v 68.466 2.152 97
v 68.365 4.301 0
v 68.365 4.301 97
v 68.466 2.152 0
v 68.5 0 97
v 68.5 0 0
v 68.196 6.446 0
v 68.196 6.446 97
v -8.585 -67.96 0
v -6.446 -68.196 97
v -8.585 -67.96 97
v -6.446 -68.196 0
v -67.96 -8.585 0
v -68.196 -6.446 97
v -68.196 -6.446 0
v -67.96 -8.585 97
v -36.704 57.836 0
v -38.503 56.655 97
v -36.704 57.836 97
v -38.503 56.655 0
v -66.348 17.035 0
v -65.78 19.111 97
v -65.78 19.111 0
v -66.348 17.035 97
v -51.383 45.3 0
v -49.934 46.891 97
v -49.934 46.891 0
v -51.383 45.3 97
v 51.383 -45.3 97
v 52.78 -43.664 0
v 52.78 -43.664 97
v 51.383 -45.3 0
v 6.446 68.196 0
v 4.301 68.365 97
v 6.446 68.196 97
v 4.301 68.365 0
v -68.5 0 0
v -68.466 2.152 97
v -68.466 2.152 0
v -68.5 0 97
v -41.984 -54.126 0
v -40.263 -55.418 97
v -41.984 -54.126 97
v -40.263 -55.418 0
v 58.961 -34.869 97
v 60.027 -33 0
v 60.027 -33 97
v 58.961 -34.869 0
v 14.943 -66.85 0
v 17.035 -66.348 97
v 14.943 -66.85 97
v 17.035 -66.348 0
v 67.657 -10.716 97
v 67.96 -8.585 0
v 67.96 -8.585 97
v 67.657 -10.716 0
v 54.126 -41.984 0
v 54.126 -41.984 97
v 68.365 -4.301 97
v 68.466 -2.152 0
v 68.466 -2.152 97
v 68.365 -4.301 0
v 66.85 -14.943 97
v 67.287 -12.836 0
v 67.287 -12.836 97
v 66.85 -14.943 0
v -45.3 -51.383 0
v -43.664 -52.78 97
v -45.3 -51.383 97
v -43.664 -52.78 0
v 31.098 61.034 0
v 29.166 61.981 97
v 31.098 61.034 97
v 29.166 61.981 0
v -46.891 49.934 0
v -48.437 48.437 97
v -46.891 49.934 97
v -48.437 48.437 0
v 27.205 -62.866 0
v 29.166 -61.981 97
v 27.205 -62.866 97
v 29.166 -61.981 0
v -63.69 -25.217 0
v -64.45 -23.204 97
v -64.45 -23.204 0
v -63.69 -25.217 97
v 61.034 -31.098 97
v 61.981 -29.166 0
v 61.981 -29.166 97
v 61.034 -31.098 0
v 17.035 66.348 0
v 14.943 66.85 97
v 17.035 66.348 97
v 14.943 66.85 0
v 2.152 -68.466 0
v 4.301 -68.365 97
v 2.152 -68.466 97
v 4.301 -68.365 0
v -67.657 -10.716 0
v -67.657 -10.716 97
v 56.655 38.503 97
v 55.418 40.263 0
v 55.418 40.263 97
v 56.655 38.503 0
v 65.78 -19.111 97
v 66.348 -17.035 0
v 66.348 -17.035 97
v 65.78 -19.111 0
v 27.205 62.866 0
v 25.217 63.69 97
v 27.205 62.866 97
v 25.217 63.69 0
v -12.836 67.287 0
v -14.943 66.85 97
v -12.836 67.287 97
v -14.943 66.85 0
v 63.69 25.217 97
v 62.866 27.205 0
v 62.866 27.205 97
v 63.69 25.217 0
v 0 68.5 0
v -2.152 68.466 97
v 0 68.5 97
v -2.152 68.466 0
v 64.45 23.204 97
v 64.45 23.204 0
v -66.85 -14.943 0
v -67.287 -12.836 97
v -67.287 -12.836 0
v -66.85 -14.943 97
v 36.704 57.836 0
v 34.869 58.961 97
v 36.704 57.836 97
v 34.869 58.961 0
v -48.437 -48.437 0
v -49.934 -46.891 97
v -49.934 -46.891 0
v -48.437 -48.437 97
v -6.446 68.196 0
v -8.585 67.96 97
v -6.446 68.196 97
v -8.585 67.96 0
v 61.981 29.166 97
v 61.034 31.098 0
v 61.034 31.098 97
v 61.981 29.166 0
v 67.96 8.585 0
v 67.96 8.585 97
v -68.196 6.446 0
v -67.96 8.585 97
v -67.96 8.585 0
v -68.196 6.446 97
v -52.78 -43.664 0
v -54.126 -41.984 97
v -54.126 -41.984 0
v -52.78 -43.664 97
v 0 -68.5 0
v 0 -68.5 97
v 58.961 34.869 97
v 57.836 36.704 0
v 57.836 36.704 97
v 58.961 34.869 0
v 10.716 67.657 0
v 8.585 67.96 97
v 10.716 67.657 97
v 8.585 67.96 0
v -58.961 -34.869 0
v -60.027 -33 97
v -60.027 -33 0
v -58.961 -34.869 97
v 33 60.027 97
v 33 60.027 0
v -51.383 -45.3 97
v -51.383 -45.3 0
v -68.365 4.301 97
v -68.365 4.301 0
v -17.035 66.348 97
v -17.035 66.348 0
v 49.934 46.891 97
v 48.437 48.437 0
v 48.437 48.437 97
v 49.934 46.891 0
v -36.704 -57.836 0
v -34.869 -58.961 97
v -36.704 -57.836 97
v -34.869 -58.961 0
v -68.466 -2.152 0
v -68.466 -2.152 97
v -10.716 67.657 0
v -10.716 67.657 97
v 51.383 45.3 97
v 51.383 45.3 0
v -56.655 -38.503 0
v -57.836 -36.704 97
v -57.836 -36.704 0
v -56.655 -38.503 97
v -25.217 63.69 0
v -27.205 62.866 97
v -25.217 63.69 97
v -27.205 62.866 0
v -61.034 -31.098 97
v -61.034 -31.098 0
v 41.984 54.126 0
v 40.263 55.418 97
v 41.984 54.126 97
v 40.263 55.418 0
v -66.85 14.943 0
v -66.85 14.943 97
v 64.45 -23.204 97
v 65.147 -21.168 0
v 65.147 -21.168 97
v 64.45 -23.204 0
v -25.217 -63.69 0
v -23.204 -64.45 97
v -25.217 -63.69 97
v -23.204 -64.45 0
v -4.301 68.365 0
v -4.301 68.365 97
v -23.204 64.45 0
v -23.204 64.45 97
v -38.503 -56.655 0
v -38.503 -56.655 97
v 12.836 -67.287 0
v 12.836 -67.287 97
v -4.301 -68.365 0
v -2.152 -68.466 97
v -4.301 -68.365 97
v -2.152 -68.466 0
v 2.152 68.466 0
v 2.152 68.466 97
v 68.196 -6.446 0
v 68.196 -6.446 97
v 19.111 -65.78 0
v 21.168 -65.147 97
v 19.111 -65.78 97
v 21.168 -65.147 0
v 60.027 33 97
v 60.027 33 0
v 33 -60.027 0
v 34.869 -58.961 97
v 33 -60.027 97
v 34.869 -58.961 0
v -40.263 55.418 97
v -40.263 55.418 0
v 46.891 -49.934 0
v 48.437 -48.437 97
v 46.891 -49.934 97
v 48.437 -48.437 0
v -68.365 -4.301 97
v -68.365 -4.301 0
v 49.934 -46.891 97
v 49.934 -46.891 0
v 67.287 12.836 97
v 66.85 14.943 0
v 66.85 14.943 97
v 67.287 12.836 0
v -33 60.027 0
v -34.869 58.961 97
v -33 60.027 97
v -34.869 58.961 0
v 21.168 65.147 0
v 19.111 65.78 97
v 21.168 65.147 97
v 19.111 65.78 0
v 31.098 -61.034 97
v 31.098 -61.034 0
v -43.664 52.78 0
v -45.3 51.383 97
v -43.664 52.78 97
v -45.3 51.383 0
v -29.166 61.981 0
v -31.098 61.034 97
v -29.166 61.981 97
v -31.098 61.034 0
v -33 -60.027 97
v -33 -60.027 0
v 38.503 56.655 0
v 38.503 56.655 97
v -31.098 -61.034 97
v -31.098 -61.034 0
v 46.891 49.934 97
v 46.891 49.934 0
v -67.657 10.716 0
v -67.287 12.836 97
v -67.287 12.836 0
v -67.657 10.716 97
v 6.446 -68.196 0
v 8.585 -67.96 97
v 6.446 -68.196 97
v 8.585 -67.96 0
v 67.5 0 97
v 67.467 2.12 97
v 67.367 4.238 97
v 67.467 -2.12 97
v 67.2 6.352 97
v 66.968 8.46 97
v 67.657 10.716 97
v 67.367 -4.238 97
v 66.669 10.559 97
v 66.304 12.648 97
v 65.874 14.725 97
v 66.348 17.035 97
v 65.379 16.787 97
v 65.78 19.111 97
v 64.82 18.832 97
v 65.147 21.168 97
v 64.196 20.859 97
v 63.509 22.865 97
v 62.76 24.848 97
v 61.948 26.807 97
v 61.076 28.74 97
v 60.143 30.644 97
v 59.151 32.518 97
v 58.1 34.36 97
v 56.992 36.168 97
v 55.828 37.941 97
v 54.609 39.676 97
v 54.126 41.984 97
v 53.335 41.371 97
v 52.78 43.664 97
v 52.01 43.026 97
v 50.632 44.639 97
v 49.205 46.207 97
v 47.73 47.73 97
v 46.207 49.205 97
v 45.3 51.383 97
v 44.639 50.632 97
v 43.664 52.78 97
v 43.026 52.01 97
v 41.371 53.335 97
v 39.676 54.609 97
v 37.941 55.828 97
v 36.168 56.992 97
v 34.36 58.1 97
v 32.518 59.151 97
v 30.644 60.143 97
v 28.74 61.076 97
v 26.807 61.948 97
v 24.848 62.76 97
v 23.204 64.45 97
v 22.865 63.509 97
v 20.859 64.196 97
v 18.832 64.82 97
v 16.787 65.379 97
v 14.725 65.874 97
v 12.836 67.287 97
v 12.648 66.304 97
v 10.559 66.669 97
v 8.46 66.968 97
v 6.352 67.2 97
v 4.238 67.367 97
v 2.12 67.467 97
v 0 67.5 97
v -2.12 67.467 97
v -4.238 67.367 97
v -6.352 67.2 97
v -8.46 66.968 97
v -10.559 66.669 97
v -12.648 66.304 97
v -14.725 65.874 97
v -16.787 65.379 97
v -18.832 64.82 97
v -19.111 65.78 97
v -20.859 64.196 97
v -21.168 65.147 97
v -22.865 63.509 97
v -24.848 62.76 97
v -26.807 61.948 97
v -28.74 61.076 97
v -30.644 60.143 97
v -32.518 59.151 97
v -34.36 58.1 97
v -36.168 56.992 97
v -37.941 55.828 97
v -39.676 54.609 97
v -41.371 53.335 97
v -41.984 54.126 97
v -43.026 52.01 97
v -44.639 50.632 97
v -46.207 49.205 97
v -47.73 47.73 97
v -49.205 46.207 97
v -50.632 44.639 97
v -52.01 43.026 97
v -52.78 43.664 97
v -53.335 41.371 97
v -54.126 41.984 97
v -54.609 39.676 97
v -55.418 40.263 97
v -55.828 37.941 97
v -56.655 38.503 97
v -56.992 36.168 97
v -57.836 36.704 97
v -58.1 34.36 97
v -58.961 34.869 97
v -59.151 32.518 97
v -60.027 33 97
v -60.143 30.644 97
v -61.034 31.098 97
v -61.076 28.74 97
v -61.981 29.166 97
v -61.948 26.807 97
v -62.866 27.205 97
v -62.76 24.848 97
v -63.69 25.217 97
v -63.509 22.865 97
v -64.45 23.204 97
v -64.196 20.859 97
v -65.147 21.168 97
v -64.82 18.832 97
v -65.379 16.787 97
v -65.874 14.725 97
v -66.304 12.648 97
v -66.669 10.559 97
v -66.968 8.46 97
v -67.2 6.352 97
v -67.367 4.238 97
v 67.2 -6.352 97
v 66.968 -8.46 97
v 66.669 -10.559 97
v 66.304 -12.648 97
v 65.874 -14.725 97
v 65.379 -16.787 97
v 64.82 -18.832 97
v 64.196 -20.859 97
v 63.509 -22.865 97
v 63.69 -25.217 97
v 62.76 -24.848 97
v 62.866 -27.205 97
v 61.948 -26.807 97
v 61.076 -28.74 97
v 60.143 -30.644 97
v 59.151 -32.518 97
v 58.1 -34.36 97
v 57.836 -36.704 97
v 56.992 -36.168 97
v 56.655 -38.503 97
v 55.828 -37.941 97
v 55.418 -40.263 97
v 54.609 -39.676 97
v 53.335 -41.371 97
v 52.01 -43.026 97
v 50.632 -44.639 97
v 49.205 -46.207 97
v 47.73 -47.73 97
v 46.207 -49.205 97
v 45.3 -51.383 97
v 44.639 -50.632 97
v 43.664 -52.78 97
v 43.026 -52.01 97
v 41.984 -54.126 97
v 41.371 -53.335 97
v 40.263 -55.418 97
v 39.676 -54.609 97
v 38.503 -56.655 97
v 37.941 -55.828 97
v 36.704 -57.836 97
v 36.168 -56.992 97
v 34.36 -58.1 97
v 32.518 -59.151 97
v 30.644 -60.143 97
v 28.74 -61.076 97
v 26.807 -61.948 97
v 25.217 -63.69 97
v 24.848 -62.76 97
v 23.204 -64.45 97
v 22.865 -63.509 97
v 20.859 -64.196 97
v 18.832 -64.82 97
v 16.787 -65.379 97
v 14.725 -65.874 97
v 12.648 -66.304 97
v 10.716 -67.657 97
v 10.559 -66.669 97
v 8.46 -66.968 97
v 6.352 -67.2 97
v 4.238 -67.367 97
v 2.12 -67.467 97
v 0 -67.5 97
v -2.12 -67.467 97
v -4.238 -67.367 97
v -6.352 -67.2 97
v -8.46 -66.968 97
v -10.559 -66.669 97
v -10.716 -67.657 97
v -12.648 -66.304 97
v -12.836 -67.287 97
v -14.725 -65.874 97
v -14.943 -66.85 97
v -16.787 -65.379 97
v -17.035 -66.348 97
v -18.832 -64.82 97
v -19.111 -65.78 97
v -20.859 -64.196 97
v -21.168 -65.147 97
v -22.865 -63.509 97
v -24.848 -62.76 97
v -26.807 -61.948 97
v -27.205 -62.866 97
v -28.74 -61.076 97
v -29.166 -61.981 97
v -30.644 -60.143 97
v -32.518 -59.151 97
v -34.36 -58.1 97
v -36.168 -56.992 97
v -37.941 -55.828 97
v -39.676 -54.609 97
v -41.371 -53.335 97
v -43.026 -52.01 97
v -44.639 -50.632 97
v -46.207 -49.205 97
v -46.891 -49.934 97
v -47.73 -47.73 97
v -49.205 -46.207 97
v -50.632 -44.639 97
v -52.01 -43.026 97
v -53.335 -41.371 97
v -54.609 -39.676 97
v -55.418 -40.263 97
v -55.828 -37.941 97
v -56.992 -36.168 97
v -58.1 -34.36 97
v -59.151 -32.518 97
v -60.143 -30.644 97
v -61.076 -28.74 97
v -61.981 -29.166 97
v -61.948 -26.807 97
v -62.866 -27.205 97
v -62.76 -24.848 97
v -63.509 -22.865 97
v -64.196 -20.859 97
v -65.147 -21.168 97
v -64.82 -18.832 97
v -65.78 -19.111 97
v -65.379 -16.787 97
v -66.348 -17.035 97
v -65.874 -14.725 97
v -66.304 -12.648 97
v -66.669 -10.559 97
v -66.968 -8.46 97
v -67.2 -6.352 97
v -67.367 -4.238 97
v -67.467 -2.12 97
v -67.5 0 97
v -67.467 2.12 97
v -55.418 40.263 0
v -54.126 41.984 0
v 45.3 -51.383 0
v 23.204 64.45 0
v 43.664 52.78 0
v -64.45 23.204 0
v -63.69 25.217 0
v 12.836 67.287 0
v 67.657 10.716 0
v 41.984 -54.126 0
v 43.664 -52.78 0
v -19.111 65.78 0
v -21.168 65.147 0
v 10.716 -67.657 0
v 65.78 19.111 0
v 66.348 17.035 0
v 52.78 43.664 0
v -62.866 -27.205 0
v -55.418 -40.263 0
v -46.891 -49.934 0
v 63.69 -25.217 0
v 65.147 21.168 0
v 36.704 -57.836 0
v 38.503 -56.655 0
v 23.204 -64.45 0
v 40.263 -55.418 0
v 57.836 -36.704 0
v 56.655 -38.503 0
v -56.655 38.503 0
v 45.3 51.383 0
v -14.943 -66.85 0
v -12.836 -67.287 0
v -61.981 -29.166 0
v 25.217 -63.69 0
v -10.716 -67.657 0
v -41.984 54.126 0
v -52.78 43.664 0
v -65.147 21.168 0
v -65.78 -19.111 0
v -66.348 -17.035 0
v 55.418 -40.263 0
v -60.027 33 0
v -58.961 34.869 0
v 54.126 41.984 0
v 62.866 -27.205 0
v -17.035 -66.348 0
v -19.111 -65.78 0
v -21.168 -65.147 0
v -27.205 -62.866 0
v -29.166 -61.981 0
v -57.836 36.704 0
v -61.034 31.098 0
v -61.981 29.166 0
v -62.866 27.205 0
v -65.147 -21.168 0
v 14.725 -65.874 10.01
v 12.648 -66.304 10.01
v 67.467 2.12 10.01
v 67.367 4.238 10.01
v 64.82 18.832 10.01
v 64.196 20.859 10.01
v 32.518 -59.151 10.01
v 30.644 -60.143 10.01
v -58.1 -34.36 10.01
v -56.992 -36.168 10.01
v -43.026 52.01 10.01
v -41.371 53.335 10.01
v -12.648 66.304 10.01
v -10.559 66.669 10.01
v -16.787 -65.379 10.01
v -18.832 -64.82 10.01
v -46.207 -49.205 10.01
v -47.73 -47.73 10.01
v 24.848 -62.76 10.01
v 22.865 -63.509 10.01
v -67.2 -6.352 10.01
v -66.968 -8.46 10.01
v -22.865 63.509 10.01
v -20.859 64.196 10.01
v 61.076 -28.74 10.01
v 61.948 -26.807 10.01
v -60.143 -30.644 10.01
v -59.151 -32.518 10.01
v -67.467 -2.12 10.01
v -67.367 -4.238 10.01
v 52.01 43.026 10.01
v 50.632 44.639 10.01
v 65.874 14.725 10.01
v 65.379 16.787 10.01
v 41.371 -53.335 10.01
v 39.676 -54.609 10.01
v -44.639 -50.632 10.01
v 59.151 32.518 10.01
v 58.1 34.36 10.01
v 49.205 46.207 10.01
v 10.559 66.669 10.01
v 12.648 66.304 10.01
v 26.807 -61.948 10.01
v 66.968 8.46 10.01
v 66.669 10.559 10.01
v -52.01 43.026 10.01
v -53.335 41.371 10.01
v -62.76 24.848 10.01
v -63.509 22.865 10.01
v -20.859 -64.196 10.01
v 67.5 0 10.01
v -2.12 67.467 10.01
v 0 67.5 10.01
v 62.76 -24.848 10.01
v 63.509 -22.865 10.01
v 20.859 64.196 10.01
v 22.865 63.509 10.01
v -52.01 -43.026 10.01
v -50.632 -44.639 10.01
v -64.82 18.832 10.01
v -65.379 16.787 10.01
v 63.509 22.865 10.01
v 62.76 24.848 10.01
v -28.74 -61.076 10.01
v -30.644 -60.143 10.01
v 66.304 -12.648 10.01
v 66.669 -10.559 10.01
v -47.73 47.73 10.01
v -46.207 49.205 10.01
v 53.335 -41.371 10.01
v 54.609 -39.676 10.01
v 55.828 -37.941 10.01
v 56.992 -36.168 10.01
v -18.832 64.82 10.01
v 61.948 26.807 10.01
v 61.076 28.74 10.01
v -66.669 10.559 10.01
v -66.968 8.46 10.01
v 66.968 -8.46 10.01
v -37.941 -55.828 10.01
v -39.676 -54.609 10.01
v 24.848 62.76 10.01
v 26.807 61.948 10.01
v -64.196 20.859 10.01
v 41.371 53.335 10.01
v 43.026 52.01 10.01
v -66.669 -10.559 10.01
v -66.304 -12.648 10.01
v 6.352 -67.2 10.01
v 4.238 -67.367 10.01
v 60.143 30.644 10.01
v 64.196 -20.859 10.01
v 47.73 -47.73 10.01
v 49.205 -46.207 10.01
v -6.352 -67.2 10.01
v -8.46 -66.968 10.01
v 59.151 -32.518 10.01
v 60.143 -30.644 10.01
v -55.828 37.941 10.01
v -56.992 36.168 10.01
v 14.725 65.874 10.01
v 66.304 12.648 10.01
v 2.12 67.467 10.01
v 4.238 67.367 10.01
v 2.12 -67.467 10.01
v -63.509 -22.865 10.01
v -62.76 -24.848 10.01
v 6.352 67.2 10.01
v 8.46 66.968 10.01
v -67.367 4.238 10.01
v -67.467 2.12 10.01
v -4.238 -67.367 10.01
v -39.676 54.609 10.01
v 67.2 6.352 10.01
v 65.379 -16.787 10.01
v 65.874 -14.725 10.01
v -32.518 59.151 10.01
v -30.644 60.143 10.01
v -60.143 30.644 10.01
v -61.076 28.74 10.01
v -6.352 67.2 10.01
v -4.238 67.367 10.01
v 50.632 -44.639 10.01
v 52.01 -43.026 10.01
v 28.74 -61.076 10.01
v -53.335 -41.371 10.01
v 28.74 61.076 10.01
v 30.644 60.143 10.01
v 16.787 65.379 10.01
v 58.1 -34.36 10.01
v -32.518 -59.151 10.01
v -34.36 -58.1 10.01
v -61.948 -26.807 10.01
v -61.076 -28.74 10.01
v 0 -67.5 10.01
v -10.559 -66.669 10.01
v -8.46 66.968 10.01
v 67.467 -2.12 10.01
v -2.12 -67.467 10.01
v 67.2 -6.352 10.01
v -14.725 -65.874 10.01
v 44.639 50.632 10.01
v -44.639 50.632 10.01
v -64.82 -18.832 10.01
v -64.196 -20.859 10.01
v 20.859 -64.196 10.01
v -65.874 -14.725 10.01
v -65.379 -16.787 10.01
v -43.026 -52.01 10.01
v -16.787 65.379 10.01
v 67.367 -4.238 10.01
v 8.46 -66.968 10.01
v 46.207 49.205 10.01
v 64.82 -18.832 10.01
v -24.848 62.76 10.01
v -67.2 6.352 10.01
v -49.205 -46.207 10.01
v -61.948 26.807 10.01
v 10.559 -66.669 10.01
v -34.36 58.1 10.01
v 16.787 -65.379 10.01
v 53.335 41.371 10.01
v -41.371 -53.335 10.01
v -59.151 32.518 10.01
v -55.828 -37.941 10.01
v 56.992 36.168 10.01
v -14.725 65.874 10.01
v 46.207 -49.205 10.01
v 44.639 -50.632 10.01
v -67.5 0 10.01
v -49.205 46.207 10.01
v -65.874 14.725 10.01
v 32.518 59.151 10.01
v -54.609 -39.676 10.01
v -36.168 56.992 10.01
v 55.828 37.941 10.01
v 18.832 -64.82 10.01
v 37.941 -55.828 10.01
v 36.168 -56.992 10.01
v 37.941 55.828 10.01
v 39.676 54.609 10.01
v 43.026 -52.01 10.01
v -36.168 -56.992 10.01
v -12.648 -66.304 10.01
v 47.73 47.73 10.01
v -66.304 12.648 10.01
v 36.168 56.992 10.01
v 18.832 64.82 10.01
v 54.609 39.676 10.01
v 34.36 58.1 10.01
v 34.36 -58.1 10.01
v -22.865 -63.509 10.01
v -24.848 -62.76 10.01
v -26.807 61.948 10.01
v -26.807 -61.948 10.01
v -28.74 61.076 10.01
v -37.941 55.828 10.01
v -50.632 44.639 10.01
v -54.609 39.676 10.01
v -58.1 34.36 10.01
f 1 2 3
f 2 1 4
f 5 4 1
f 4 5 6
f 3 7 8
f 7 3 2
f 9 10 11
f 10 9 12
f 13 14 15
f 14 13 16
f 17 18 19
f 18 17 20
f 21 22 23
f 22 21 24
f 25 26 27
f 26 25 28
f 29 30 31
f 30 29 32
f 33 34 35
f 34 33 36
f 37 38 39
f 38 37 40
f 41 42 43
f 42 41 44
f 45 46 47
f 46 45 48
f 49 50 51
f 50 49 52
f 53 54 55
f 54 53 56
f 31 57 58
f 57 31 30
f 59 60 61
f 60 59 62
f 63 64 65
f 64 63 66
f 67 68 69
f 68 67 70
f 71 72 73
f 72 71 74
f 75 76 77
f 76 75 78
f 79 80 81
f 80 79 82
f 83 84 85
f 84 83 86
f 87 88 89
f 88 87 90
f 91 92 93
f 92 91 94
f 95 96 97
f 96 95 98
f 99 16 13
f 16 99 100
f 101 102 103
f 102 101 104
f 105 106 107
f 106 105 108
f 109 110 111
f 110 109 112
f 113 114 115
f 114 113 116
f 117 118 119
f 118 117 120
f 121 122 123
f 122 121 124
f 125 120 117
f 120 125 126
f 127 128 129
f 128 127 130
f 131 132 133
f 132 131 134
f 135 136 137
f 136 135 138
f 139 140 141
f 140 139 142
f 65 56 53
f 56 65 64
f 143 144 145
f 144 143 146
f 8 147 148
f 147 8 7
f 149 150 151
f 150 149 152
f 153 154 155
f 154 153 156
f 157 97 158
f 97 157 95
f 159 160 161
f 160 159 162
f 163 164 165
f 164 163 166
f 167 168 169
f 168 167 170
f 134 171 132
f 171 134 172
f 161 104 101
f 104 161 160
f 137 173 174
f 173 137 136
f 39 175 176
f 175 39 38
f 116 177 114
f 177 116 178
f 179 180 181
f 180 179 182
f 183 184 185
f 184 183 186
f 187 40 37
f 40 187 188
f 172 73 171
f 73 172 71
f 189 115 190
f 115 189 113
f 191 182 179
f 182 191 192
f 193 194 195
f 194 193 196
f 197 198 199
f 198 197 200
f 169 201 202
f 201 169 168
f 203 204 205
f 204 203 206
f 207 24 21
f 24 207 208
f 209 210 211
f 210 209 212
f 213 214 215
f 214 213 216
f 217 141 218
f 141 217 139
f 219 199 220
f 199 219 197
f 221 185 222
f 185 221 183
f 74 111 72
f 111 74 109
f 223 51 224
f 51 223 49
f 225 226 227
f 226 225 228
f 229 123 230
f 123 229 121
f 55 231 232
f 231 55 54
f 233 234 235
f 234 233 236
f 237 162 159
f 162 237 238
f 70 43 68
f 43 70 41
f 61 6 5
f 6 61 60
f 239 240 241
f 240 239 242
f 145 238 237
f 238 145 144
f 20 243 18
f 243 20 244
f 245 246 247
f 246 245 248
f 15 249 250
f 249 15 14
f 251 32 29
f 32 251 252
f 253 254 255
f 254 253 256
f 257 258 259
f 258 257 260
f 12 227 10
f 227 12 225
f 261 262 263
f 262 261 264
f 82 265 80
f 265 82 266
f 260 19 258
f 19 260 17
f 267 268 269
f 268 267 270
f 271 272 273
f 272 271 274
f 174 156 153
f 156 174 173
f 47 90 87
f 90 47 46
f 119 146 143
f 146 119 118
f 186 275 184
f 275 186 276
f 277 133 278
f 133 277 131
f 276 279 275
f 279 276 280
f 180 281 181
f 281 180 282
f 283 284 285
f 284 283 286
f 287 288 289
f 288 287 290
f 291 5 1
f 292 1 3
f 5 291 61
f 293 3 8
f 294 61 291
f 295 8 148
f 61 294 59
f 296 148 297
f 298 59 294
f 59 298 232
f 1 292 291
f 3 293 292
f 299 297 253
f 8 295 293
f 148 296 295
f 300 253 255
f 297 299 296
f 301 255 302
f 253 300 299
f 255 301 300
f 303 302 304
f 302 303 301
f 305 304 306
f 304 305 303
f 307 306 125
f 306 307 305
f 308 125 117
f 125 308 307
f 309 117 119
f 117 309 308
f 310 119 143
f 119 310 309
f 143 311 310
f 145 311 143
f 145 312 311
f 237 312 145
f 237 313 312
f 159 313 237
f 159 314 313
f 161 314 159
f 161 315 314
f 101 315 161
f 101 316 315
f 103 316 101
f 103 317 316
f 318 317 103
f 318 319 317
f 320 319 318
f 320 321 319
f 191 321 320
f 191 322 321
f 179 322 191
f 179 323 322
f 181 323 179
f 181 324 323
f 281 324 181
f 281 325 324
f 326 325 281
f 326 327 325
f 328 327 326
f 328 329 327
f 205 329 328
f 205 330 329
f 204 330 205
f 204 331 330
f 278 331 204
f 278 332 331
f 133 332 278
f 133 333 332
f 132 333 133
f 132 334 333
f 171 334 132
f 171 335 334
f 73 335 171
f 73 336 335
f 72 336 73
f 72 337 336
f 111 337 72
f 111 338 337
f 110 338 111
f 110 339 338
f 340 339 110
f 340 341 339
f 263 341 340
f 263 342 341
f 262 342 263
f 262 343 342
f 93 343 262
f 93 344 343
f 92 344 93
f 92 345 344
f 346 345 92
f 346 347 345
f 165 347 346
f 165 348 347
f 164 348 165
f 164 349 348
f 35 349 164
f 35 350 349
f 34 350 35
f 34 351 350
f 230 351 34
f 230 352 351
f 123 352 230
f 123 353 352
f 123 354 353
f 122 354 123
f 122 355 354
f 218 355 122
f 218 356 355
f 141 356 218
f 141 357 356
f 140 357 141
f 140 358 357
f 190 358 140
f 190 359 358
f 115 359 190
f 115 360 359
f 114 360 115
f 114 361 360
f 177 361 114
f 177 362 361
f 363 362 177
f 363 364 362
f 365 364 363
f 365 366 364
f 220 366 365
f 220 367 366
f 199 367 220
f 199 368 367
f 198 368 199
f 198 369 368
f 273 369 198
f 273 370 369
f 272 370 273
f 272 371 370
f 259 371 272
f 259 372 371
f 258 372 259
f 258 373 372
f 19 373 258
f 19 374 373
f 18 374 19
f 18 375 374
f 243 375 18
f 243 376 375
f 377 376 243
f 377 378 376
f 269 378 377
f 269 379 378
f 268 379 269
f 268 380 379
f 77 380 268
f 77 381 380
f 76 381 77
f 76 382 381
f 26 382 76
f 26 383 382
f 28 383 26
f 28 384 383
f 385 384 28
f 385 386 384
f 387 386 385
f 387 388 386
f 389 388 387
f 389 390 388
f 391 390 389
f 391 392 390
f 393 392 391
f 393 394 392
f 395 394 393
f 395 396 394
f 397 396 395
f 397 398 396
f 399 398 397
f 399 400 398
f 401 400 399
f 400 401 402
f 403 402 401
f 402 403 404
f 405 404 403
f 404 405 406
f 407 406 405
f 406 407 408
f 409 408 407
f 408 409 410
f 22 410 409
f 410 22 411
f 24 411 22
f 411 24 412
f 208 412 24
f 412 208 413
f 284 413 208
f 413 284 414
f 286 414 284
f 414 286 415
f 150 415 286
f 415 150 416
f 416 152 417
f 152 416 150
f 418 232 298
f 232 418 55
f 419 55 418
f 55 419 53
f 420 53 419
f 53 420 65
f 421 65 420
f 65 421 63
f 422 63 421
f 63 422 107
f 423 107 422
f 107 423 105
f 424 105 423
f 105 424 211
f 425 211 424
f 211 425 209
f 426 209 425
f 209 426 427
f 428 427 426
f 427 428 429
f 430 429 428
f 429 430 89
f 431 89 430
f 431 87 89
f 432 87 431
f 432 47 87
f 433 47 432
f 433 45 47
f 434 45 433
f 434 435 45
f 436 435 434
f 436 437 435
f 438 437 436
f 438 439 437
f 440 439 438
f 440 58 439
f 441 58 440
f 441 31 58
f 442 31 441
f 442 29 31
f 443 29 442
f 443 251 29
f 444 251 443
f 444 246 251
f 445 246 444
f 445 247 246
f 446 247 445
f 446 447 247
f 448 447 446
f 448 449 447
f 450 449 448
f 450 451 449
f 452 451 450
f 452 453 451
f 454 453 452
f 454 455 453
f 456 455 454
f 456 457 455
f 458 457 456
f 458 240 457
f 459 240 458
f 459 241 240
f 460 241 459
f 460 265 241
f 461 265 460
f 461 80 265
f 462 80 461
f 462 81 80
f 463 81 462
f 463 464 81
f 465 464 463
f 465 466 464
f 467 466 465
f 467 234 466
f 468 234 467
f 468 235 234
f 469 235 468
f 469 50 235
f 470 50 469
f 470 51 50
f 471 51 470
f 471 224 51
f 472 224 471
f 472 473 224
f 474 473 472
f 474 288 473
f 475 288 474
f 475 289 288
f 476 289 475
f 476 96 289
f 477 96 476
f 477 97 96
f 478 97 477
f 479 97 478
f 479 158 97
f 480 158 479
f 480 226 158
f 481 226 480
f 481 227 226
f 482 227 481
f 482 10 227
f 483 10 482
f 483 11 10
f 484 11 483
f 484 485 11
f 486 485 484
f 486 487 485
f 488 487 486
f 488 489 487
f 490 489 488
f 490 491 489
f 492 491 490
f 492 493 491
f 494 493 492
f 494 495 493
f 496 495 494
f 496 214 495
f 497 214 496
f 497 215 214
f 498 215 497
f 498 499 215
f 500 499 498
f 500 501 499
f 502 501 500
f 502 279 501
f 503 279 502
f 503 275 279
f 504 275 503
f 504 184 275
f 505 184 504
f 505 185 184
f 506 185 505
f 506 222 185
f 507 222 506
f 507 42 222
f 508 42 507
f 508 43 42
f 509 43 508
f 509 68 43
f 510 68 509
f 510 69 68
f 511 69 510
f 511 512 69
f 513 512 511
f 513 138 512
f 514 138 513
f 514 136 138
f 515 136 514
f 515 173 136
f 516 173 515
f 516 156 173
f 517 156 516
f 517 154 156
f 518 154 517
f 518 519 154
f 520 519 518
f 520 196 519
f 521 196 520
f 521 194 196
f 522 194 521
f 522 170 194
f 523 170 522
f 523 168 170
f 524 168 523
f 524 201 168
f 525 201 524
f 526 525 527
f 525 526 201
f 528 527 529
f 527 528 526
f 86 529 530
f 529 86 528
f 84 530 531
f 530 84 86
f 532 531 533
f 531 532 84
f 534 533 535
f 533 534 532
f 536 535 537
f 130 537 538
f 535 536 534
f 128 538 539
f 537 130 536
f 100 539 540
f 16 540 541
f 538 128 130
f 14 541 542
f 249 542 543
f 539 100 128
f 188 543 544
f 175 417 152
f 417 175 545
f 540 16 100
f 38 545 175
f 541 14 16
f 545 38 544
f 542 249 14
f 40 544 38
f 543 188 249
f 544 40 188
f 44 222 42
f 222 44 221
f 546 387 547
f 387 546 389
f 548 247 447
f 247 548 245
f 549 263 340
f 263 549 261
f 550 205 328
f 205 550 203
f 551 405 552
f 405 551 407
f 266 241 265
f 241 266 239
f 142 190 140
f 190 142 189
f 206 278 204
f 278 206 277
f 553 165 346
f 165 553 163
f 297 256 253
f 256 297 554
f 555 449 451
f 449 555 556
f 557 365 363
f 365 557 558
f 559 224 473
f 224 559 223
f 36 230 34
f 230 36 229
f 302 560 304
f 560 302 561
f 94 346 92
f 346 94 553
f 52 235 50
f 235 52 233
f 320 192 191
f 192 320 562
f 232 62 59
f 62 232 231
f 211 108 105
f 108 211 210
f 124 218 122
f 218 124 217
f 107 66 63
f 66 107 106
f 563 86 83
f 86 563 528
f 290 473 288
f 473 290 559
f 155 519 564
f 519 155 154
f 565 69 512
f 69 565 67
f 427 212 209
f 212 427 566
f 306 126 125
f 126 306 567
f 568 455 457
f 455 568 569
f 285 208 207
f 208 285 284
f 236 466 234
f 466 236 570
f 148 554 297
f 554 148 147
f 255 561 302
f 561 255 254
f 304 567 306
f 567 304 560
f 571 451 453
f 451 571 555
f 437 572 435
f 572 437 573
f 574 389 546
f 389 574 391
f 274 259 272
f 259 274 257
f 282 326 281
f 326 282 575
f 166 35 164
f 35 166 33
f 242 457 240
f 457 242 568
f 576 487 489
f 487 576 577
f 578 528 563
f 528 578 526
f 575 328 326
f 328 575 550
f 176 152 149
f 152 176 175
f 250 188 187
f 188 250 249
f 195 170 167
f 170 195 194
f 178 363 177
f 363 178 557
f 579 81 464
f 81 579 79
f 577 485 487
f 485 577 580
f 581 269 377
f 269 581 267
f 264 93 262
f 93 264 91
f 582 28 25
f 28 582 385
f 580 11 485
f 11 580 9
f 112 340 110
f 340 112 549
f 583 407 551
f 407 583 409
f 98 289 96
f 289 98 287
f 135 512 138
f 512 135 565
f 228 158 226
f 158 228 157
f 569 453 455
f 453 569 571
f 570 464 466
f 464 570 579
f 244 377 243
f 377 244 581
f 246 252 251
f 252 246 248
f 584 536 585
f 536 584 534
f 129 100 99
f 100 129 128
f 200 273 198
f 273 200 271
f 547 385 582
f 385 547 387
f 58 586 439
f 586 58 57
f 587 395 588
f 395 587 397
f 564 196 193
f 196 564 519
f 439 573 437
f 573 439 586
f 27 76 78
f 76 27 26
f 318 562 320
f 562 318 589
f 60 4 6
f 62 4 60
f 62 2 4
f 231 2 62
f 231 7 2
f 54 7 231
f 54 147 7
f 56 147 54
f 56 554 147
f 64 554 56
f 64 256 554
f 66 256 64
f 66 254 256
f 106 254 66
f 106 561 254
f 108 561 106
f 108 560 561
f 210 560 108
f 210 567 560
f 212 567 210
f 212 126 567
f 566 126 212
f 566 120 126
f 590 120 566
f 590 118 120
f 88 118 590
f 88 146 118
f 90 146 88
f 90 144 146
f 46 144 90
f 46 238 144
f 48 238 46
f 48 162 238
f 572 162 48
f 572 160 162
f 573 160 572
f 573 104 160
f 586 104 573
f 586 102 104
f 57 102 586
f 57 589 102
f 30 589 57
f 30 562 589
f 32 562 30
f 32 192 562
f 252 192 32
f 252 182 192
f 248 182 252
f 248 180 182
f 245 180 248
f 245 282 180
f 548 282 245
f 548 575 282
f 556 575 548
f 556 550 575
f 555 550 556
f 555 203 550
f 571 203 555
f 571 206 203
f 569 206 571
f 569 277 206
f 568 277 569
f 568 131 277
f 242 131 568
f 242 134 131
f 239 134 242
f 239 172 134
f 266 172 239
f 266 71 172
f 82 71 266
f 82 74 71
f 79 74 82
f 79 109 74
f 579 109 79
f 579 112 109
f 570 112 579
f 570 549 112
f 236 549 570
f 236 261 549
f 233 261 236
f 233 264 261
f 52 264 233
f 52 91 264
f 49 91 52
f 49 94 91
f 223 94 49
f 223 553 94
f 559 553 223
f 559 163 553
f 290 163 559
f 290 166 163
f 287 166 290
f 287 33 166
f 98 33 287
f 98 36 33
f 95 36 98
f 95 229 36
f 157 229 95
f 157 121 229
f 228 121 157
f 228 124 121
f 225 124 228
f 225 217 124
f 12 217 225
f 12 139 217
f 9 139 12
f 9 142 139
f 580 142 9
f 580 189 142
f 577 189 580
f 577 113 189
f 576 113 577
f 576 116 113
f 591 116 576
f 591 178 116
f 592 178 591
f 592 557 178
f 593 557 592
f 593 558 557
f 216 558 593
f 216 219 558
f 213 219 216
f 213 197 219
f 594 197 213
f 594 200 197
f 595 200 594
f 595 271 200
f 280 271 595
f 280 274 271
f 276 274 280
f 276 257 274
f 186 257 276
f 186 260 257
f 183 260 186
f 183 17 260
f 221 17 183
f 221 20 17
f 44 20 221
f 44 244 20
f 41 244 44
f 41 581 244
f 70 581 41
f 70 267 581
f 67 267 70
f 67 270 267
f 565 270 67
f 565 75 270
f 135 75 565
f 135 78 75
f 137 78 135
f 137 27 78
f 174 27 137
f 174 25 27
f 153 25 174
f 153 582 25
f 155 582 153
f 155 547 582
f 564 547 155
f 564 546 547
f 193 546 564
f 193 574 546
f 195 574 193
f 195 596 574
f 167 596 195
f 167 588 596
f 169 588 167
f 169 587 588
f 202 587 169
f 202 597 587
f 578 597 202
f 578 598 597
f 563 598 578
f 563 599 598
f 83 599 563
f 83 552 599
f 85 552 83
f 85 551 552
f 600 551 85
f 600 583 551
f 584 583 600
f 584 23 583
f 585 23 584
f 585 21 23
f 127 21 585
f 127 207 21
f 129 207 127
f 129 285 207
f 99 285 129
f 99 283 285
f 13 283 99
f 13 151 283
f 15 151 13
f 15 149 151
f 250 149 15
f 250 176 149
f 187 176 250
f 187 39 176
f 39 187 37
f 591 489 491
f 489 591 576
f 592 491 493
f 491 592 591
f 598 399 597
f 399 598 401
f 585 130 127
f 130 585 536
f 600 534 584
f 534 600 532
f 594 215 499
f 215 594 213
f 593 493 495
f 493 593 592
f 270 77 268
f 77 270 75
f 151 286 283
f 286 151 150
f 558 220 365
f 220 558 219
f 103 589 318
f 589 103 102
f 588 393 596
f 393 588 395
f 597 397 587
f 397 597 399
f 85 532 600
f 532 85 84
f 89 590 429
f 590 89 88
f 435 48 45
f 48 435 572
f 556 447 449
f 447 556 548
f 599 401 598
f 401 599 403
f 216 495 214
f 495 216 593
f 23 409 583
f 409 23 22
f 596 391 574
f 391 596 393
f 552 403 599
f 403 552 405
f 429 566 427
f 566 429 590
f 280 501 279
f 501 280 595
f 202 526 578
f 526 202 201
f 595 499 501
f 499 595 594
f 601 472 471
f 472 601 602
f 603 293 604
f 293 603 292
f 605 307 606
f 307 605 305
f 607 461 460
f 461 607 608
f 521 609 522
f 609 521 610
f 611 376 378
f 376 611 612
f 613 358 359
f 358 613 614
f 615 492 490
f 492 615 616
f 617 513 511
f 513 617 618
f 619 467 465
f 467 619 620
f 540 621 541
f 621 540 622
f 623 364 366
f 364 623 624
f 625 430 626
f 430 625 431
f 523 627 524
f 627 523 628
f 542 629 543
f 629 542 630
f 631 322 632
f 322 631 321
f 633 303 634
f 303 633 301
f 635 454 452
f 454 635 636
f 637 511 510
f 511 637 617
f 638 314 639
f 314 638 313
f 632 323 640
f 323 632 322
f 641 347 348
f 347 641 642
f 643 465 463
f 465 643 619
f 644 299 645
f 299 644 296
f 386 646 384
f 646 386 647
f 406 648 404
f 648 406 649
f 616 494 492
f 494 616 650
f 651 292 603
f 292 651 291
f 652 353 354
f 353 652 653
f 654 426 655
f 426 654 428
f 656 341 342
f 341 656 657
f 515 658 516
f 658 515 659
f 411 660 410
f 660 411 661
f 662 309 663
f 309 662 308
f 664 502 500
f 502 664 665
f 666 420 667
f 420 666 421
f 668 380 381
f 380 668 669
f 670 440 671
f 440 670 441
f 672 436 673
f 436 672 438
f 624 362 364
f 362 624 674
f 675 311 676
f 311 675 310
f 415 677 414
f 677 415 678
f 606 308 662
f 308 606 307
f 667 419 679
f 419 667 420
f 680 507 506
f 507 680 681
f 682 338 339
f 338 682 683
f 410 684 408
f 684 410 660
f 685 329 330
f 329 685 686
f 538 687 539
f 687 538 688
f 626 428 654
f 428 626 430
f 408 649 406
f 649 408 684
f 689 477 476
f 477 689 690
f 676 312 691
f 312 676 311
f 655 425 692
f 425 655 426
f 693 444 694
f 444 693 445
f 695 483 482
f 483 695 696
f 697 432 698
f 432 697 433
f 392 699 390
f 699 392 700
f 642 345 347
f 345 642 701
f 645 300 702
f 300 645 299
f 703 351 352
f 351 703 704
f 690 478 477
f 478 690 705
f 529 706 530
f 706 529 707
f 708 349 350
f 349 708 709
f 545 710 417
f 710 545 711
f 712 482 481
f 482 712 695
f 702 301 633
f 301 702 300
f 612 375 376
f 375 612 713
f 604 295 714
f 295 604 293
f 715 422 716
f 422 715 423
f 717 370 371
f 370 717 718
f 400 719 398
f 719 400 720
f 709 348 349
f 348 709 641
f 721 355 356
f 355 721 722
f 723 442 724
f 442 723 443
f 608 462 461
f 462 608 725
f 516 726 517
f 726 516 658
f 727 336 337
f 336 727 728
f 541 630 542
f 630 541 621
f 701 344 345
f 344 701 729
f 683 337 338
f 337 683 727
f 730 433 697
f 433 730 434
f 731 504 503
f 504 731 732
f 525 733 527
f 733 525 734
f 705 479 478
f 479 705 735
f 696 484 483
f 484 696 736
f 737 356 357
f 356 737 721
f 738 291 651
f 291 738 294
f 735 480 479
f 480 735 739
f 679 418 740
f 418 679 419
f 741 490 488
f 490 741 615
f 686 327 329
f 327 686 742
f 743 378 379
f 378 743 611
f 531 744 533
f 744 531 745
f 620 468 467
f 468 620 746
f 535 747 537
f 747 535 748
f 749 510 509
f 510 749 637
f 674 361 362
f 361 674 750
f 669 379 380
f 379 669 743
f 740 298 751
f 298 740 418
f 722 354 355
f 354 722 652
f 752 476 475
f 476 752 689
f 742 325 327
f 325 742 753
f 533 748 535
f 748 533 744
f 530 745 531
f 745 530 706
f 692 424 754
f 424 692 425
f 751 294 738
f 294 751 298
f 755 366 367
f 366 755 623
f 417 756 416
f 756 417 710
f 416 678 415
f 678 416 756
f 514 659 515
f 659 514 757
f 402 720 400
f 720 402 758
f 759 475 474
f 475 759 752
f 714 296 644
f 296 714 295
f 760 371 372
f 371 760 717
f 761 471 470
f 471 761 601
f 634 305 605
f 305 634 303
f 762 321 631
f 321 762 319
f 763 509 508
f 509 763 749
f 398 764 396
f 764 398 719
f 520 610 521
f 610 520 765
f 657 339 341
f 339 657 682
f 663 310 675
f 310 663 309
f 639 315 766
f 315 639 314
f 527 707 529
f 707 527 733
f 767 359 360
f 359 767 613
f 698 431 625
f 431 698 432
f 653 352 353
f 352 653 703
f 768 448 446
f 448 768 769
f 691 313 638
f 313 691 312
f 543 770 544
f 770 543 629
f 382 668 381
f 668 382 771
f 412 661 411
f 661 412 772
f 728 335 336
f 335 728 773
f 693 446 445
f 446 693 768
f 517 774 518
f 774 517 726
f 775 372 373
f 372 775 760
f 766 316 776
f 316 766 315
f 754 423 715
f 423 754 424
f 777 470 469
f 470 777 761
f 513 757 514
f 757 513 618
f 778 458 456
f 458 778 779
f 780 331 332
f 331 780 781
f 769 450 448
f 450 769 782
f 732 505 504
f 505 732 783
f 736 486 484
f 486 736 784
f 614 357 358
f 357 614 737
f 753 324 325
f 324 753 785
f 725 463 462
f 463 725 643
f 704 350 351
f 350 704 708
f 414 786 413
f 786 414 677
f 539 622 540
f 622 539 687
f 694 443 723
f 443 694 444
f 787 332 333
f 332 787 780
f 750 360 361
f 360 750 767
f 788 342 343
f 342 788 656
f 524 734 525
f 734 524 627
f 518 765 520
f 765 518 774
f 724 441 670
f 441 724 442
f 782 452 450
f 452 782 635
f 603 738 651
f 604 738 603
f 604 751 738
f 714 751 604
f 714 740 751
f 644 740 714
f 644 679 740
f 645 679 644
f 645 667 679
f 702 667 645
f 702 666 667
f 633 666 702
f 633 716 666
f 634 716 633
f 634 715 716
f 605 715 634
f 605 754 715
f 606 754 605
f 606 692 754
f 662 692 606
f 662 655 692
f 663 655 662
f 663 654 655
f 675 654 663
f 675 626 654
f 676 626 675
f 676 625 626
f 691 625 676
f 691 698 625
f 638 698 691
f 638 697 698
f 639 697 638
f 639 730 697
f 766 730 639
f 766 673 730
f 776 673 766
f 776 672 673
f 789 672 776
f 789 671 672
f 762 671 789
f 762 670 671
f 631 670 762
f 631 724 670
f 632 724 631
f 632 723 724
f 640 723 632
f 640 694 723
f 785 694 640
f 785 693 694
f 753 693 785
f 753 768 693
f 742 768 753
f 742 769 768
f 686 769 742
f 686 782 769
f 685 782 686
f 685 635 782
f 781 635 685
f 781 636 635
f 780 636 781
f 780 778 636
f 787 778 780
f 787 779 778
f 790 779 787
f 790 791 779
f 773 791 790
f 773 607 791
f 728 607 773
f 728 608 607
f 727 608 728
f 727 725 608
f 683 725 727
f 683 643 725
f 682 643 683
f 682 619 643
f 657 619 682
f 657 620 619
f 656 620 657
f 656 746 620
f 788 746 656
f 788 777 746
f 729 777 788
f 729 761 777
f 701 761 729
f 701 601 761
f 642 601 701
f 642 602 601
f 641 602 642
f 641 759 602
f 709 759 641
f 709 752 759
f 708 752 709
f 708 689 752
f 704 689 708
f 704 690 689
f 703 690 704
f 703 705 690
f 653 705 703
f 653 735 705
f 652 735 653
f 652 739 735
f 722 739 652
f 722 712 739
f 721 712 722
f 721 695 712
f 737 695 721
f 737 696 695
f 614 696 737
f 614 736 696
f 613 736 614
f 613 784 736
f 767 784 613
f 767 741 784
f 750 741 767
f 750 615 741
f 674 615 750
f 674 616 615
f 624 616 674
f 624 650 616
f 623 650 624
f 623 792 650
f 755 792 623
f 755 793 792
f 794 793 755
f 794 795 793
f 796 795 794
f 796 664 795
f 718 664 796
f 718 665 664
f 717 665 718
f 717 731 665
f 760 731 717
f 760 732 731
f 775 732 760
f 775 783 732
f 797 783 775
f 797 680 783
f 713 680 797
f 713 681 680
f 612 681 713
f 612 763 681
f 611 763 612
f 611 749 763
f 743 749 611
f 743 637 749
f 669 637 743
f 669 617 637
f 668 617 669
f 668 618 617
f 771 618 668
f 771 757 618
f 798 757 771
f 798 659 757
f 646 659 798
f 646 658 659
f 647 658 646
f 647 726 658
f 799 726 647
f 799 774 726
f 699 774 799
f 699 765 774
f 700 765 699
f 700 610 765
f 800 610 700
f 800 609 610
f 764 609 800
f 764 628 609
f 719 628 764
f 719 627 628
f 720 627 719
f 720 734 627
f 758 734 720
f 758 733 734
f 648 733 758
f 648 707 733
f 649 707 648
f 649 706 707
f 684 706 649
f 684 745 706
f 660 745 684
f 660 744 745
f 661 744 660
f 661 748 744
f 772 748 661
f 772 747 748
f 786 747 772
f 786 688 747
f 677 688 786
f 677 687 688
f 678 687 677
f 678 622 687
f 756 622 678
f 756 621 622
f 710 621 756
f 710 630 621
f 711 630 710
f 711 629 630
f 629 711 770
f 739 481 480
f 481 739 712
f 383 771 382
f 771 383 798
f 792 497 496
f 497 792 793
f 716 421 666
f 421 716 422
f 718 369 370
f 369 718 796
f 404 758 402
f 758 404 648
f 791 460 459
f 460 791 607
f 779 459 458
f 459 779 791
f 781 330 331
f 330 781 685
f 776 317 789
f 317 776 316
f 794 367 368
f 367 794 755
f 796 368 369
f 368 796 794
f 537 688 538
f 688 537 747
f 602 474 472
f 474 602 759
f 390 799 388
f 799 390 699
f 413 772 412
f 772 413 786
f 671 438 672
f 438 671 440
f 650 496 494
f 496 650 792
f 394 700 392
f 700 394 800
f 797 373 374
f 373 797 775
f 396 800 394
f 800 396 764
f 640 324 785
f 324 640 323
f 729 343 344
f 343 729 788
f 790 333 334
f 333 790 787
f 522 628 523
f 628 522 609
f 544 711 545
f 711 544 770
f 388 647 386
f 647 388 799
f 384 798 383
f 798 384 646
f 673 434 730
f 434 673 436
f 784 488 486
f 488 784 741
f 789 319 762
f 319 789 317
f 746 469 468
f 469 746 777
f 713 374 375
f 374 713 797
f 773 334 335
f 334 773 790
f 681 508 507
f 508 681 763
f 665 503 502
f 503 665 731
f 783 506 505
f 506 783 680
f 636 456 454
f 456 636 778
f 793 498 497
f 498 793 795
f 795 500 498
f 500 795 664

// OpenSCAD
/*
This is a pot cover for some pots I want to display.
A difference of 2mm between the inner and outer measurements has ok strength and is relatively fast to print.
The small cover has the same outer dimensions as the large cover, so it actually uses more material. It's for a smaller pot so I just raise up the inner height.
*/
$fn = 200;

// large
//pot_cover(135, 137, 95, 97);

// small
pot_cover(135, 137, 87, 97);

module pot_cover(id, od, ih, oh) {
    difference() {
        cylinder(h = oh, d = od);
        translate([0, 0, oh - ih + 0.01])
        cylinder(h = id, d = id);
    }
}
